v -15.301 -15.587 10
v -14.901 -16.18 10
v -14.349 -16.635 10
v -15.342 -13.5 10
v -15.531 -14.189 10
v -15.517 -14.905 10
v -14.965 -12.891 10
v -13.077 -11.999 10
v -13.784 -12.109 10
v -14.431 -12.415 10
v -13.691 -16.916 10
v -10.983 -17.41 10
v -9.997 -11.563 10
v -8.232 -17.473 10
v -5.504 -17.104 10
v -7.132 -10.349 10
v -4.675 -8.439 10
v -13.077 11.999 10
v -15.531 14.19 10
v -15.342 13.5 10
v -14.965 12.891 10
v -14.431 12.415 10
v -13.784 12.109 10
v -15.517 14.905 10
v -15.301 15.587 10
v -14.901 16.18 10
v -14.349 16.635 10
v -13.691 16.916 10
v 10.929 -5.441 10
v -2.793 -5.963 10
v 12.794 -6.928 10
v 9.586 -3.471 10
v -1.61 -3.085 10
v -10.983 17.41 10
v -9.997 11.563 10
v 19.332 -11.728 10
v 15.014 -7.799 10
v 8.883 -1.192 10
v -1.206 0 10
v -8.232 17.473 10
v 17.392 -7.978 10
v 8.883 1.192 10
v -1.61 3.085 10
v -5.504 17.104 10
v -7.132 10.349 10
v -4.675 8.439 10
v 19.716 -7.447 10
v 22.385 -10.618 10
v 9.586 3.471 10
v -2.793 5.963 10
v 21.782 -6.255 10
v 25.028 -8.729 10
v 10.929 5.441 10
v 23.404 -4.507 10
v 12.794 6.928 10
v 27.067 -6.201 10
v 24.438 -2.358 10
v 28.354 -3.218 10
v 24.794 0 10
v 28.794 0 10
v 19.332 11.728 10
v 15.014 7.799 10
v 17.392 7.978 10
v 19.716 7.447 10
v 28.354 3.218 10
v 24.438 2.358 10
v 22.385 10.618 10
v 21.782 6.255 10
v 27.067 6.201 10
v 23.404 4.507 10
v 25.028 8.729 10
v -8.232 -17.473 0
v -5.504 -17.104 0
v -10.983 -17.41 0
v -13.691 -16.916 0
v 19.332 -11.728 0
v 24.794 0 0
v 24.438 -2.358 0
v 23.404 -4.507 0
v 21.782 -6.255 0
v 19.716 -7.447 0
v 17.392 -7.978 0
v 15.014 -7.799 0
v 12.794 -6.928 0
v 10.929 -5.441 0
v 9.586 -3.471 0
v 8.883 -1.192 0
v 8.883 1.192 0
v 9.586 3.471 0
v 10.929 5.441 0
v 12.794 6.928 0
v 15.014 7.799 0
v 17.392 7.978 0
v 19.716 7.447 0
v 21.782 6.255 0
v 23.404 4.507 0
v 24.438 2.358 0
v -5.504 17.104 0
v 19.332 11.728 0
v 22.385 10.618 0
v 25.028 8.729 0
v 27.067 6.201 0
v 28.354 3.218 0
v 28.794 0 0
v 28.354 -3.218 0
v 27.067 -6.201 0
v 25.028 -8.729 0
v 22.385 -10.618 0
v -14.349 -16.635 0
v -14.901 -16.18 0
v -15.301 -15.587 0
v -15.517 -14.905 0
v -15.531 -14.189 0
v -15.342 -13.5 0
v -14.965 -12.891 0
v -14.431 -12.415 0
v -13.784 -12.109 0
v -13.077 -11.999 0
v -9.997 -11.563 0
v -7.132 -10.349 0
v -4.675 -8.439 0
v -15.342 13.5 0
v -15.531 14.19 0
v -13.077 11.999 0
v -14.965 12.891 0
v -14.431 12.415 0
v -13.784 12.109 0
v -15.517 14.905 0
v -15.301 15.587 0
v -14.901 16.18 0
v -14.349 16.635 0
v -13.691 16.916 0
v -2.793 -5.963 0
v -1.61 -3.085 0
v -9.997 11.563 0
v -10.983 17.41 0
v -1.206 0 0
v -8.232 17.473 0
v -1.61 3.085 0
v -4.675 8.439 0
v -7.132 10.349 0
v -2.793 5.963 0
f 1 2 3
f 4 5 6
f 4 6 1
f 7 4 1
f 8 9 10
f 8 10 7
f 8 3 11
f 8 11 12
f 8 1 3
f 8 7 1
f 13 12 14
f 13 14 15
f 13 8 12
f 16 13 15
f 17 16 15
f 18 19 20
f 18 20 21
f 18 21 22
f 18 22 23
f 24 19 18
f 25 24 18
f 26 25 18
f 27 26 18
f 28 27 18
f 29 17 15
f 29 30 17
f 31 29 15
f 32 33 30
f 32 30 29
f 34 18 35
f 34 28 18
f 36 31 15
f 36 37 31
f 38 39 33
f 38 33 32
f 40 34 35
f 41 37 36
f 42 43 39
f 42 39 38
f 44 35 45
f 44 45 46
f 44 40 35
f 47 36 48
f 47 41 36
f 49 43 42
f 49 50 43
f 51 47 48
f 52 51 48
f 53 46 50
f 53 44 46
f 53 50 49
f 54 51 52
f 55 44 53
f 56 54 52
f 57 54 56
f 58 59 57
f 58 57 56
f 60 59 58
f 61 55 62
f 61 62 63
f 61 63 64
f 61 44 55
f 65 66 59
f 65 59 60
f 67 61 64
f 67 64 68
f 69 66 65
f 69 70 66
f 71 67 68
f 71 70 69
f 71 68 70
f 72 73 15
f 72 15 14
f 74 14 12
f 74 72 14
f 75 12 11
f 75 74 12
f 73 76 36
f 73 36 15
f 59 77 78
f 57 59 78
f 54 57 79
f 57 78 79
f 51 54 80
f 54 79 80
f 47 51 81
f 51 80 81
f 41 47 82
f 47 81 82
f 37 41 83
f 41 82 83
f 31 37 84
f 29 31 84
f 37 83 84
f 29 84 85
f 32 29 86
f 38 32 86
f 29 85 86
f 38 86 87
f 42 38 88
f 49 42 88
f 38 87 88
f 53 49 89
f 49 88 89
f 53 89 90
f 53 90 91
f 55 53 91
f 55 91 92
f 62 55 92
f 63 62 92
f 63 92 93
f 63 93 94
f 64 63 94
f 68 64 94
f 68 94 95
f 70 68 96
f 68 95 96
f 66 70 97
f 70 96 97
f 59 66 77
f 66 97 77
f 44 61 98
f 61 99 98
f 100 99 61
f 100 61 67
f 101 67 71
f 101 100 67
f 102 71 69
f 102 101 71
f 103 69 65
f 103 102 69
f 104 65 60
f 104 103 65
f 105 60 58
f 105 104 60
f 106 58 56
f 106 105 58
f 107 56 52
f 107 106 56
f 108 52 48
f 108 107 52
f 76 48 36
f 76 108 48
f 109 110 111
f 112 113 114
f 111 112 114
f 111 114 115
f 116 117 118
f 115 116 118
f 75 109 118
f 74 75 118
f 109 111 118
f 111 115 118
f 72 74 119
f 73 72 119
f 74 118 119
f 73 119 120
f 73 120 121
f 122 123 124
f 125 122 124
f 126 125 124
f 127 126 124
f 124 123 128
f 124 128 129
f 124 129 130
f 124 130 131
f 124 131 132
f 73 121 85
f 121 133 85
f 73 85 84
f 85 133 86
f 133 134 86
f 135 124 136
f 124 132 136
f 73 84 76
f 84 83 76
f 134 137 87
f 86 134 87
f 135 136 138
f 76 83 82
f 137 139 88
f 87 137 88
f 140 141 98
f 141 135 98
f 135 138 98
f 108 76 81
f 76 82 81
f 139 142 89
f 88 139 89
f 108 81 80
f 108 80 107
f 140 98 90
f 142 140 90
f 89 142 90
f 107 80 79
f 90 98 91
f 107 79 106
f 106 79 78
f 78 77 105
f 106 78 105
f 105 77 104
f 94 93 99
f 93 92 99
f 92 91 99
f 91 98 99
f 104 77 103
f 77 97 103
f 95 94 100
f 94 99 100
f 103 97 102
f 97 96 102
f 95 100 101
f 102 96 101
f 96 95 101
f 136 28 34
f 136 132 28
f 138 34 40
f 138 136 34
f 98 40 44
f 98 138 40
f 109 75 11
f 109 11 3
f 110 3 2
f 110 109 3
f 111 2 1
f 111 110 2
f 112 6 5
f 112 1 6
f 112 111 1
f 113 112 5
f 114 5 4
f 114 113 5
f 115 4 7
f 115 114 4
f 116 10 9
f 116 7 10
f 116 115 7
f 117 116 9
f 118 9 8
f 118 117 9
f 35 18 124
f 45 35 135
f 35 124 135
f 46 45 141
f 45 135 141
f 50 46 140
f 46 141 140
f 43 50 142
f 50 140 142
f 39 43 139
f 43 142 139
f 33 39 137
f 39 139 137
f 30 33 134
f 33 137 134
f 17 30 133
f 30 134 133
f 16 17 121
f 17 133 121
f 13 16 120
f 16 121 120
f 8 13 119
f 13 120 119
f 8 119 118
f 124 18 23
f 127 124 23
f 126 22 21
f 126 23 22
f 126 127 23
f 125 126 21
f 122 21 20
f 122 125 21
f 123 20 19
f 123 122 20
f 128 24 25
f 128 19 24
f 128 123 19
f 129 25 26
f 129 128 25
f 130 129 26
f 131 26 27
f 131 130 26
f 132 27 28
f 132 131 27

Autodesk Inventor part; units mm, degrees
ref_plane "YZ Plane" through (0, 0, 0) normal (1, 0, 0) x (0, 1, 0)
ref_plane "XZ Plane" through (0, 0, 0) normal (0, 1, 0) x (-1, 0, 0)
ref_plane "XY Plane" through (0, 0, 0) normal (0, 0, 1) x (1, 0, 0)
sketch "스케치1" plane through (0, 0, 0) normal (0, 0, 1) x (1, 0, 0)
  line L0 (0, 41.7955) -> (0, -35.3319)
  line L1 (-51.4236, 0) -> (57.1089, 0)
  arc A0 (-13.077, -11.9993) -> (-13.077, 11.9993) centre (-13.2063, 0) ccw
  circle A1 centre (16.7937, 0) radius 8
  line L2 (19.3321, 11.7284) -> (-5.5044, 17.104)
  line L3 (19.3321, -11.7284) -> (-5.5044, -17.104)
  arc A2 (-13.6907, 16.9157) -> (-13.077, 11.9993) centre (-13.0501, 14.4992) ccw
  arc A3 (-13.077, -11.9993) -> (-13.6907, -16.9157) centre (-13.0501, -14.4992) ccw
  arc A4 (19.3321, -11.7284) -> (19.3321, 11.7284) centre (16.7937, 0) ccw
  arc A5 (-5.5044, 17.104) -> (-13.6907, 16.9157) centre (-9.2063, 0) ccw
  arc A6 (-13.6907, -16.9157) -> (-5.5044, -17.104) centre (-9.2063, 0) ccw
  point P0 (0, 0)
  dimension "d1" = 24
  dimension "d4" = 30
  dimension "d8" = 16
  dimension "d9" = 4
  dimension "d10" = 5
  dimension "d11" = 5
extrude "돌출1" add sketch "스케치1" along normal blind 10 contours L2 A4 L1 A1 L0 | L0 L1 A0 A2 A5 L2 | L1 A1 A4 L3 L0 | L0 L3 A6 A3 A0 L1
properties part number "240412_sketch4"
